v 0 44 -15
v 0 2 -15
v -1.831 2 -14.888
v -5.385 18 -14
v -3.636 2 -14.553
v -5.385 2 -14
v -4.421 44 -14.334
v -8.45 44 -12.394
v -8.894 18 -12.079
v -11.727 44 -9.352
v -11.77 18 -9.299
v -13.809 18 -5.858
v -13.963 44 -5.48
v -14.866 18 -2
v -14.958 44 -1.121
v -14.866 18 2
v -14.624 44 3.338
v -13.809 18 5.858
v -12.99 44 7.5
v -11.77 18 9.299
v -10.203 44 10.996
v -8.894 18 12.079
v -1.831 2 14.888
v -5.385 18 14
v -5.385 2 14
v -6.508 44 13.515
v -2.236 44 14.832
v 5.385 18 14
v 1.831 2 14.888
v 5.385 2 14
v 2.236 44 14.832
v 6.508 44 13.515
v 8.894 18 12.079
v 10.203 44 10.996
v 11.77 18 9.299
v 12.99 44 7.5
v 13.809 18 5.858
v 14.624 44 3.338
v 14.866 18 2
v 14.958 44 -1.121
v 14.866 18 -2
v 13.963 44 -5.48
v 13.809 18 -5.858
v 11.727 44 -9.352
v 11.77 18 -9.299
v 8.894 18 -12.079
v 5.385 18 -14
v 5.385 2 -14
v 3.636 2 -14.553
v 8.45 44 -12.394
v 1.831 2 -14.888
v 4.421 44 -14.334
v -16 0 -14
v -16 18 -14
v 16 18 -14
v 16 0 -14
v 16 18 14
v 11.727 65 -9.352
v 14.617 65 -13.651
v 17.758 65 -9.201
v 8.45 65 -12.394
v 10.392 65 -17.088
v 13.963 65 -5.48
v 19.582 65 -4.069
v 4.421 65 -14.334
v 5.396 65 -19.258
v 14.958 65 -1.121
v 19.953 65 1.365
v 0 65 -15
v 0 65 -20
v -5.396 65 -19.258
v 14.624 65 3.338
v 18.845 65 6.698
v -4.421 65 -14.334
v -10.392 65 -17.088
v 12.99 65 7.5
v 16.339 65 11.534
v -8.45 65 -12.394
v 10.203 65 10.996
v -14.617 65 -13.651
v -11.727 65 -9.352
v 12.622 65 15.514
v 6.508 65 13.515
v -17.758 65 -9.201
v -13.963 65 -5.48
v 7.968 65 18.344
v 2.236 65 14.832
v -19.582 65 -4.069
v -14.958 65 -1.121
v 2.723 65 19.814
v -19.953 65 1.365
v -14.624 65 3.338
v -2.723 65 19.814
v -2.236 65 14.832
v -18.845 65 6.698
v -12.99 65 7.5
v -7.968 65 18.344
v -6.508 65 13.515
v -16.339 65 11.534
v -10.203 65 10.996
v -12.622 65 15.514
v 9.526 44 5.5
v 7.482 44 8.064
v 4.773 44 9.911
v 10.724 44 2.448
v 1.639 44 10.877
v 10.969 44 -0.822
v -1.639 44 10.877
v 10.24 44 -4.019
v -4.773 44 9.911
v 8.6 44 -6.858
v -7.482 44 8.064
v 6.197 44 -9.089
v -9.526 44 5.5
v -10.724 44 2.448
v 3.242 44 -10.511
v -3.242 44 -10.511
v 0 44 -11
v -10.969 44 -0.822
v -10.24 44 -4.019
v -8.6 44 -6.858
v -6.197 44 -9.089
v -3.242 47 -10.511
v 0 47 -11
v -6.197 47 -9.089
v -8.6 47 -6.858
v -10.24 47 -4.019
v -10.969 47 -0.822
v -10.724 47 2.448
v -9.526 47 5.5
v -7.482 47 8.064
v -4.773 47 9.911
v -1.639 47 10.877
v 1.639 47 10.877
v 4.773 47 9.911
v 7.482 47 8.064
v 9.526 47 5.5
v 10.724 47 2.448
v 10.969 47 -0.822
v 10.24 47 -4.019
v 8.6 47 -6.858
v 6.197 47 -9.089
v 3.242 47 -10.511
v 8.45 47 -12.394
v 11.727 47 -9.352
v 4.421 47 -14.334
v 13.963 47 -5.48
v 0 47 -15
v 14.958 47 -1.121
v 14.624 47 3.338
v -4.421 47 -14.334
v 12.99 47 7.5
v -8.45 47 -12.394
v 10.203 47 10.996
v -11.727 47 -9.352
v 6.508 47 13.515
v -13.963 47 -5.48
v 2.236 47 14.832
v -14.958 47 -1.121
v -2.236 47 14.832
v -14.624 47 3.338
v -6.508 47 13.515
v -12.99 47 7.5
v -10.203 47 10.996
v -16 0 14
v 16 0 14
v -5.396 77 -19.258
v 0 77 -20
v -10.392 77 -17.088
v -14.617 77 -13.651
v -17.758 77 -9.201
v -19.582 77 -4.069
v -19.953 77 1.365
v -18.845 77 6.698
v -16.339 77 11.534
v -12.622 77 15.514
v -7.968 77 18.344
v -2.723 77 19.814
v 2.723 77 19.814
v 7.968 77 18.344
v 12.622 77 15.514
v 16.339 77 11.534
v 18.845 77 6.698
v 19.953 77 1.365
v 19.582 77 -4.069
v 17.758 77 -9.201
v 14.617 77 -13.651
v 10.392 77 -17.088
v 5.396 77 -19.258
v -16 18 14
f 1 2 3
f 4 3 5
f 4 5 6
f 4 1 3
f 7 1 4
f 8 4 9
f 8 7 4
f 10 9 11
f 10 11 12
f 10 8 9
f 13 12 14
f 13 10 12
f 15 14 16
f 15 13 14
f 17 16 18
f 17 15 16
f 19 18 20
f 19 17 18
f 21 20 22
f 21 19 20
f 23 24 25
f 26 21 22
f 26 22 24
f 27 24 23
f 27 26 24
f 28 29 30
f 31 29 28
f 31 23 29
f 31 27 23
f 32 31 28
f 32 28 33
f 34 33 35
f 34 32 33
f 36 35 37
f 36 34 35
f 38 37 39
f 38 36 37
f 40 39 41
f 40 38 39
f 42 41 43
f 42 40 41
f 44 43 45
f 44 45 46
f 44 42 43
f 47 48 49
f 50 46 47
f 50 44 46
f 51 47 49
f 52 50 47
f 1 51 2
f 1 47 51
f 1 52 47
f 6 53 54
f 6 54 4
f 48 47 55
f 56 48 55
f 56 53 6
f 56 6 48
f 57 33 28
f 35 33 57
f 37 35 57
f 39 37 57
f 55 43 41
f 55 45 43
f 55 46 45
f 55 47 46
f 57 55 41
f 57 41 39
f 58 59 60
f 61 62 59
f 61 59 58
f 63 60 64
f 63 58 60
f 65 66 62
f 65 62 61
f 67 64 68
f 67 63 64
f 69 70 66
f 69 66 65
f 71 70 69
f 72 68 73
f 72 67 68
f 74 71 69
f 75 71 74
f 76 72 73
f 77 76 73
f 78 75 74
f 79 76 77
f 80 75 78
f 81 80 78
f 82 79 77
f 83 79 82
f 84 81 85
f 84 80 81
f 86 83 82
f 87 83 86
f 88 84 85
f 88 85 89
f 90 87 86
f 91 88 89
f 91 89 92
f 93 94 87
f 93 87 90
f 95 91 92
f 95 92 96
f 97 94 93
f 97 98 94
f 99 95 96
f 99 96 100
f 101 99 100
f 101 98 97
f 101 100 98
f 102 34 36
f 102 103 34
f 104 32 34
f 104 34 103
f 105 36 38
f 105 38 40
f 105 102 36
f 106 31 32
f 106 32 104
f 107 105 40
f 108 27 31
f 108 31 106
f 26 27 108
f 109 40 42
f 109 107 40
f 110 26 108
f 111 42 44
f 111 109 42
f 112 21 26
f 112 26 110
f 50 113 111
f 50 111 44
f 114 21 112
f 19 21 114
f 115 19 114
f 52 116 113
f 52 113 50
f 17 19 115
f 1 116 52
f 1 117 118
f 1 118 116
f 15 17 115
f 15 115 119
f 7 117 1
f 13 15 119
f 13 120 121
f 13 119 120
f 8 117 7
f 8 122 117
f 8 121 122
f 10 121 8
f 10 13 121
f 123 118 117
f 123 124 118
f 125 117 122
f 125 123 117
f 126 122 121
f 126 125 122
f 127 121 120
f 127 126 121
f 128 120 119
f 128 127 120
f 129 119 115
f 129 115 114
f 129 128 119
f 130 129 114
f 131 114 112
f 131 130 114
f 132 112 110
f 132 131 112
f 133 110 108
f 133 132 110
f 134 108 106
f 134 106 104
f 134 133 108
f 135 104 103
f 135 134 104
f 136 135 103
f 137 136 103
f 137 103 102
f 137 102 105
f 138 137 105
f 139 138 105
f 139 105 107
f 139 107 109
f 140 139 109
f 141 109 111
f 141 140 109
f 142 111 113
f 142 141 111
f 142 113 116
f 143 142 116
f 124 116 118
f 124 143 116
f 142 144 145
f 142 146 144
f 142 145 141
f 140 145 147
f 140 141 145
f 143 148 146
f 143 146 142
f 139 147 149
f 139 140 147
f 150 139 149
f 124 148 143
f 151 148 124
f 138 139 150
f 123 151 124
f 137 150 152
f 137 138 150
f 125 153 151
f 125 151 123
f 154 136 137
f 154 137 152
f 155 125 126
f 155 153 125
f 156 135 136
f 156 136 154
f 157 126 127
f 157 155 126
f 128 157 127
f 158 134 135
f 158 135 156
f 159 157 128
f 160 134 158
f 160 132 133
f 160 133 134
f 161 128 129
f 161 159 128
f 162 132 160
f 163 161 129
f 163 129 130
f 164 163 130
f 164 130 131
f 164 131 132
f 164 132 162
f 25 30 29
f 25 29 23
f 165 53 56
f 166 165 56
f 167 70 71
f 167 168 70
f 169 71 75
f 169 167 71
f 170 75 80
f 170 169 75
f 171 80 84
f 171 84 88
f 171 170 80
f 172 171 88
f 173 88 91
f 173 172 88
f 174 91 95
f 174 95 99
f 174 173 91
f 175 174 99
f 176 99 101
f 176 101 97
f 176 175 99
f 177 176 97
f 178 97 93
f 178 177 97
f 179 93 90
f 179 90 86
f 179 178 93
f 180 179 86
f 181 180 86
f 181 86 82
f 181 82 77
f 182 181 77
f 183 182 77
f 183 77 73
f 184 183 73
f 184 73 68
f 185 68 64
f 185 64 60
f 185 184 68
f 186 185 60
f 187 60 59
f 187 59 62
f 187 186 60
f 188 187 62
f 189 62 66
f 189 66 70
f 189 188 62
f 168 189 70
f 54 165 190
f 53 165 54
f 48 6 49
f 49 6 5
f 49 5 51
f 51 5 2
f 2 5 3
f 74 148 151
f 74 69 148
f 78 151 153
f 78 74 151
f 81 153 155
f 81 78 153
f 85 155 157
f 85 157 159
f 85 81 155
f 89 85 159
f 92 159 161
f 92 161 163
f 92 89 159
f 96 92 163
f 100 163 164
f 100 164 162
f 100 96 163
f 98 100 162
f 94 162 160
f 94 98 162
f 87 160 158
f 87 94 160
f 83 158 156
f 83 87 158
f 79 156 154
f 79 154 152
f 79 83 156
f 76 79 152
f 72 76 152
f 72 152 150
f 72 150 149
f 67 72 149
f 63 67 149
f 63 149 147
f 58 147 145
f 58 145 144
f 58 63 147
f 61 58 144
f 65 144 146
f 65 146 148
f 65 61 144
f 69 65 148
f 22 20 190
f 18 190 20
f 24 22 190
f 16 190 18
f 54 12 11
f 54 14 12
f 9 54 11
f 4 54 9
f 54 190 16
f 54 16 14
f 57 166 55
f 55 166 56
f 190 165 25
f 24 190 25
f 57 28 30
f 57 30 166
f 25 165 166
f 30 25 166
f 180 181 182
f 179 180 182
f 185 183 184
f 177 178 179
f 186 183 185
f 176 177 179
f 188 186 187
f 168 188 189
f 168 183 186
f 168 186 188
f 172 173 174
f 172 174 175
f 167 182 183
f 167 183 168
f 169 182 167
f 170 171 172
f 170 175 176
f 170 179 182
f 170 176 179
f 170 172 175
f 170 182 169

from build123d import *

# Parameters (mm, degrees)
SK_P02_CONTACTBLOCKSNC1NC2_W  = 32
SK_P02_CONTACTBLOCKSNC1NC2_H  = 28
P02_CONTACTBLOCKSNC1NC2_DEPTH = 18


with BuildPart() as part:
    # SK_P01_Mushroomandbody → P01_Mushroomandbody (revolve)
    with BuildSketch(Plane.XY, mode=Mode.PRIVATE) as p01_mushroomandbody_sk:
        Polygon((0, 2), (15, 2), (15, 44), (11, 44), (11, 47), (15, 47), (15, 65), (20, 65), (20, 77), (0, 77), align=None)
    revolve(p01_mushroomandbody_sk.sketch.rotate(Axis((0, -3, 0), (0, 1, 0)), 90), axis=Axis((0, -3, 0), (0, 1, 0)))

    # SK_P02_ContactblocksNC1NC2 → P02_ContactblocksNC1NC2 (add)
    with BuildSketch(Plane(origin=(0, 0, 0), x_dir=(1, 0, 0), z_dir=(0, 1, 0))):
        Rectangle(SK_P02_CONTACTBLOCKSNC1NC2_W, SK_P02_CONTACTBLOCKSNC1NC2_H)
    extrude(amount=P02_CONTACTBLOCKSNC1NC2_DEPTH)


solid = part.part
